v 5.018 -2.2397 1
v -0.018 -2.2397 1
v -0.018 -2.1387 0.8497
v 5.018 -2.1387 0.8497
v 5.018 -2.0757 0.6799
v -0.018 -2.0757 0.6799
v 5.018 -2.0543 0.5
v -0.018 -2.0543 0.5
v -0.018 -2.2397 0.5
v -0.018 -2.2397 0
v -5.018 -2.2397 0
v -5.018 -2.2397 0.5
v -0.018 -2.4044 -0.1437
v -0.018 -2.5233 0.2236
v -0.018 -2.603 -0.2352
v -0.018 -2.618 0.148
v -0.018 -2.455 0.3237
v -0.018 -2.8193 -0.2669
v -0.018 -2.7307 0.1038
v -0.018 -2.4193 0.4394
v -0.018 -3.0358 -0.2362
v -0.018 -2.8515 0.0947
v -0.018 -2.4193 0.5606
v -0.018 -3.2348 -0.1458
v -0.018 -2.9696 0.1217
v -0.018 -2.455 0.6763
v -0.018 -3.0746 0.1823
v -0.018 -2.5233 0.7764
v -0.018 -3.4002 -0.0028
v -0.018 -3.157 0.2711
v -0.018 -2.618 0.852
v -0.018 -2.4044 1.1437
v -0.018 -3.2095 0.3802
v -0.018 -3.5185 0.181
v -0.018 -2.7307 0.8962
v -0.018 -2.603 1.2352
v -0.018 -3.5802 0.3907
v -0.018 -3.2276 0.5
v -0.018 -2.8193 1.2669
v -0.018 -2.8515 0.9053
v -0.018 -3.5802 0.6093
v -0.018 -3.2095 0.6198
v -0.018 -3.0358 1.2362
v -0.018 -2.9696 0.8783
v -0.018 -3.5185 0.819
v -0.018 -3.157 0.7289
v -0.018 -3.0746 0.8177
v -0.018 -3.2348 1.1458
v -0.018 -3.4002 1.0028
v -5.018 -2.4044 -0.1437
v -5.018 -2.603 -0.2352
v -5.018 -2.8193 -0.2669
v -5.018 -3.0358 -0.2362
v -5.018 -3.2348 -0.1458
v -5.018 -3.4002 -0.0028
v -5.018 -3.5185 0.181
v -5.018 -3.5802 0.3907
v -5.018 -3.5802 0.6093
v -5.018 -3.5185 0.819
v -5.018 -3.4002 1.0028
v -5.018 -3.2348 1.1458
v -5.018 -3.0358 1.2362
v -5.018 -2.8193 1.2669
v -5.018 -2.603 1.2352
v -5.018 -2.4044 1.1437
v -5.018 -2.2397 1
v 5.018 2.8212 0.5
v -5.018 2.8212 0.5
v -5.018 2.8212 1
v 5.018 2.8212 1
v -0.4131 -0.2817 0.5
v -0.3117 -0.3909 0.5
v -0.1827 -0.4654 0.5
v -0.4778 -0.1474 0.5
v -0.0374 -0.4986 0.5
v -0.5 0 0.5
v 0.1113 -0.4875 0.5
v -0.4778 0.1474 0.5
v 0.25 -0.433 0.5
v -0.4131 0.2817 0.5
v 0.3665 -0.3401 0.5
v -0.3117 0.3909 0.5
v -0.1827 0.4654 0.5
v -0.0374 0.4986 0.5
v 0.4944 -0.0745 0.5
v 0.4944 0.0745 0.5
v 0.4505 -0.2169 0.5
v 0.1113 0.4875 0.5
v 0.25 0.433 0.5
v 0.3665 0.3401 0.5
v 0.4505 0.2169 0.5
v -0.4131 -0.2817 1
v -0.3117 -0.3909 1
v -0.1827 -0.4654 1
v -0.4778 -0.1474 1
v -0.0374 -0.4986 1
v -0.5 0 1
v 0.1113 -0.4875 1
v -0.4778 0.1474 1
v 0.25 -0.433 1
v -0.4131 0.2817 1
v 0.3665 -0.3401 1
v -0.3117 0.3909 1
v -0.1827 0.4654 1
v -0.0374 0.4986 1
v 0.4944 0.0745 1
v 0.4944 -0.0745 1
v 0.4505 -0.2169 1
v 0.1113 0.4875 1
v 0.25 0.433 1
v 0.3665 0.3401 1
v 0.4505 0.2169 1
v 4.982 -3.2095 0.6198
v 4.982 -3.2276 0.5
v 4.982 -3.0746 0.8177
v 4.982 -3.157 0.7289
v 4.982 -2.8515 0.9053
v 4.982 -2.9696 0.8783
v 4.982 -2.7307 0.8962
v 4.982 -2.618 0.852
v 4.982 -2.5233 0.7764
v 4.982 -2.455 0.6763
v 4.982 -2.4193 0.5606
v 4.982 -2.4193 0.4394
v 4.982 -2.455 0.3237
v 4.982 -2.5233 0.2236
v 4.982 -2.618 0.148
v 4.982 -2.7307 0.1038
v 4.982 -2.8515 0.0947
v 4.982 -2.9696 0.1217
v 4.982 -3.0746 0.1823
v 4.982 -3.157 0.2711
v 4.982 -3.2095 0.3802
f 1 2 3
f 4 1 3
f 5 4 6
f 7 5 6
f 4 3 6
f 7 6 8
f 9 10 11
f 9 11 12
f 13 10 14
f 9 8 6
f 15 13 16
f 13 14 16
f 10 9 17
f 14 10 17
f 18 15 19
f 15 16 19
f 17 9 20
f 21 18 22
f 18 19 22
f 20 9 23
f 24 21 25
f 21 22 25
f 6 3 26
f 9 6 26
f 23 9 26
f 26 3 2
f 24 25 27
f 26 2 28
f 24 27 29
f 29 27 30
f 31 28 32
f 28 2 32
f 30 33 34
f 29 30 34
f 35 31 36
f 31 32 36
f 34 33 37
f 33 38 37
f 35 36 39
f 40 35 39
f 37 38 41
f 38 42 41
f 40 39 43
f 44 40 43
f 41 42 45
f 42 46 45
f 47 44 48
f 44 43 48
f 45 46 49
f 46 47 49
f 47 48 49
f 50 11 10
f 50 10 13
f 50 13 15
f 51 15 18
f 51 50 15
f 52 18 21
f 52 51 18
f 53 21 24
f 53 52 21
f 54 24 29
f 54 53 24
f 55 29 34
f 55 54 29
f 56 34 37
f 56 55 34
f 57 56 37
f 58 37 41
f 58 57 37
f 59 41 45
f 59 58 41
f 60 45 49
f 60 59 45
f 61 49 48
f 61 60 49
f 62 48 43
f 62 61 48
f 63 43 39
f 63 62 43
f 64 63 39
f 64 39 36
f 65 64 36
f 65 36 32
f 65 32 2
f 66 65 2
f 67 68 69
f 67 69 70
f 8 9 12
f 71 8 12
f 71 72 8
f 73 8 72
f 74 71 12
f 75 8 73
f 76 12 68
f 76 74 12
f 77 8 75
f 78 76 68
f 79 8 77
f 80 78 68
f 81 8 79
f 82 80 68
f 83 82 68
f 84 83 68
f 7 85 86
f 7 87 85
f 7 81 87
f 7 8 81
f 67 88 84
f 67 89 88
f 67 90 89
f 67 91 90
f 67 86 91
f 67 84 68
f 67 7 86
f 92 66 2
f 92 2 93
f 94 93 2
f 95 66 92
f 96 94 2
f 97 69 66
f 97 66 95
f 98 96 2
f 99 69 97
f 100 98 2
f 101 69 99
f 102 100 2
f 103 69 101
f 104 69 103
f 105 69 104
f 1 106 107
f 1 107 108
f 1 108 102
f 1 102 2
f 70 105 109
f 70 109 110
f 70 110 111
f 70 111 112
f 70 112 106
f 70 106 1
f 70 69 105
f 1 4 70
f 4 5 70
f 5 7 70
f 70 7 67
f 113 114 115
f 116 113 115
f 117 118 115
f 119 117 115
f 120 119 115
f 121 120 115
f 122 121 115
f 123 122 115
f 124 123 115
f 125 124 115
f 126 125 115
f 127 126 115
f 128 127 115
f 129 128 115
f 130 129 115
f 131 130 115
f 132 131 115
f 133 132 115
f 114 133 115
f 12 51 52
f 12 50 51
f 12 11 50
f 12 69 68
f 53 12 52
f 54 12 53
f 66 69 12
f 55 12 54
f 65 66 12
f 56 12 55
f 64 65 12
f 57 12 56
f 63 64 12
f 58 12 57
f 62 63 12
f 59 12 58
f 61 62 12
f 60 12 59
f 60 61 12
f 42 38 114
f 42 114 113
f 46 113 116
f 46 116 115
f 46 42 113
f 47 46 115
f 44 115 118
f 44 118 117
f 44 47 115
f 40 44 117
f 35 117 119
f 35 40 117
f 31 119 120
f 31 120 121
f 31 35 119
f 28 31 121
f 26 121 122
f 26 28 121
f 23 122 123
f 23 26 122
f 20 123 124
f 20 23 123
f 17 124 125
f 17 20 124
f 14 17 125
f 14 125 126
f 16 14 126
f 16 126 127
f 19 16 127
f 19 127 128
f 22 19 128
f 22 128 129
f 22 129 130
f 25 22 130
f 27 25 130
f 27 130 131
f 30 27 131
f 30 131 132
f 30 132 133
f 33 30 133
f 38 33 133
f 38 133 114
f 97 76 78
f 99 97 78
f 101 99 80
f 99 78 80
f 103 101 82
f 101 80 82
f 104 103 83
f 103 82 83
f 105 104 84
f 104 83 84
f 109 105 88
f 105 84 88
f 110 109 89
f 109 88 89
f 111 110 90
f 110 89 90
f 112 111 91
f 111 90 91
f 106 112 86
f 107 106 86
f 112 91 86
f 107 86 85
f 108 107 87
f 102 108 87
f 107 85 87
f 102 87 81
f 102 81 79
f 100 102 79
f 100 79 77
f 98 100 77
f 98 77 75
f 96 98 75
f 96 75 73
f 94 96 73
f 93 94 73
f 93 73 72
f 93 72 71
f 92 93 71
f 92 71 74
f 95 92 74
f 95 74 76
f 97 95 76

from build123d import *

# Parameters (mm, degrees)
F0_W      = 10.0359702483
F0_H      = 5.6423433125
F1_DEPTH  = 1
F2_R      = 0.7668699523
F3_DEPTH  = 10.08
F4_DEPTH  = 5
F5_R      = 0.4064089658
F6_DEPTH  = 10
F8_D      = 1
F8_DEPTH  = 2
F8_TIP    = 0.3004303095
F9_W      = 5.0608886507
F9_H      = 0.5
F10_DEPTH = 25


with BuildPart() as f1:
    # F0 (on Top) → F1 (new body)
    with BuildSketch(Plane.XY):
        Rectangle(F0_W, F0_H)
    extrude(amount=F1_DEPTH)

    # F2 (on face) → F3 (cut)
    with BuildSketch(Plane(origin=(-5.0179851241, 0, 0), x_dir=(0, -1, 0), z_dir=(-1, 0, 0))):
        with Locations((2.8211716563, 0.5)):
            Circle(F2_R)
    extrude(amount=-F3_DEPTH, mode=Mode.SUBTRACT)

    # F2 (on face) → F4 (join)
    with BuildSketch(Plane(origin=(-5.0179851241, 0, 0), x_dir=(0, -1, 0), z_dir=(-1, 0, 0))):
        with Locations((2.8211716563, 0.5)):
            Circle(F2_R)
    extrude(amount=-F4_DEPTH)

    # F5 (on face) → F6 (join)
    with BuildSketch(Plane(origin=(-5.0179851241, 0, 0), x_dir=(0, -1, 0), z_dir=(-1, 0, 0))):
        with Locations((2.8211716563, 0.5)):
            Circle(F5_R)
    extrude(amount=-F6_DEPTH)

    # F8
    with Locations(Plane.XY.offset(1)):
        with Locations((0, 0)):
            Hole(F8_D / 2, depth=F8_DEPTH)
            with Locations((0, 0, -(F8_DEPTH + F8_TIP / 2))):  # 118° drill point
                Cone(0, F8_D / 2, F8_TIP, mode=Mode.SUBTRACT)

    # F9 (on face) → F10 (cut)
    with BuildSketch(Plane.YZ.offset(5.0179851241)):
        with Locations((0.2907273309, 0.25)):
            Rectangle(F9_W, F9_H)
    extrude(amount=-F10_DEPTH, mode=Mode.SUBTRACT)


solid = f1.part
